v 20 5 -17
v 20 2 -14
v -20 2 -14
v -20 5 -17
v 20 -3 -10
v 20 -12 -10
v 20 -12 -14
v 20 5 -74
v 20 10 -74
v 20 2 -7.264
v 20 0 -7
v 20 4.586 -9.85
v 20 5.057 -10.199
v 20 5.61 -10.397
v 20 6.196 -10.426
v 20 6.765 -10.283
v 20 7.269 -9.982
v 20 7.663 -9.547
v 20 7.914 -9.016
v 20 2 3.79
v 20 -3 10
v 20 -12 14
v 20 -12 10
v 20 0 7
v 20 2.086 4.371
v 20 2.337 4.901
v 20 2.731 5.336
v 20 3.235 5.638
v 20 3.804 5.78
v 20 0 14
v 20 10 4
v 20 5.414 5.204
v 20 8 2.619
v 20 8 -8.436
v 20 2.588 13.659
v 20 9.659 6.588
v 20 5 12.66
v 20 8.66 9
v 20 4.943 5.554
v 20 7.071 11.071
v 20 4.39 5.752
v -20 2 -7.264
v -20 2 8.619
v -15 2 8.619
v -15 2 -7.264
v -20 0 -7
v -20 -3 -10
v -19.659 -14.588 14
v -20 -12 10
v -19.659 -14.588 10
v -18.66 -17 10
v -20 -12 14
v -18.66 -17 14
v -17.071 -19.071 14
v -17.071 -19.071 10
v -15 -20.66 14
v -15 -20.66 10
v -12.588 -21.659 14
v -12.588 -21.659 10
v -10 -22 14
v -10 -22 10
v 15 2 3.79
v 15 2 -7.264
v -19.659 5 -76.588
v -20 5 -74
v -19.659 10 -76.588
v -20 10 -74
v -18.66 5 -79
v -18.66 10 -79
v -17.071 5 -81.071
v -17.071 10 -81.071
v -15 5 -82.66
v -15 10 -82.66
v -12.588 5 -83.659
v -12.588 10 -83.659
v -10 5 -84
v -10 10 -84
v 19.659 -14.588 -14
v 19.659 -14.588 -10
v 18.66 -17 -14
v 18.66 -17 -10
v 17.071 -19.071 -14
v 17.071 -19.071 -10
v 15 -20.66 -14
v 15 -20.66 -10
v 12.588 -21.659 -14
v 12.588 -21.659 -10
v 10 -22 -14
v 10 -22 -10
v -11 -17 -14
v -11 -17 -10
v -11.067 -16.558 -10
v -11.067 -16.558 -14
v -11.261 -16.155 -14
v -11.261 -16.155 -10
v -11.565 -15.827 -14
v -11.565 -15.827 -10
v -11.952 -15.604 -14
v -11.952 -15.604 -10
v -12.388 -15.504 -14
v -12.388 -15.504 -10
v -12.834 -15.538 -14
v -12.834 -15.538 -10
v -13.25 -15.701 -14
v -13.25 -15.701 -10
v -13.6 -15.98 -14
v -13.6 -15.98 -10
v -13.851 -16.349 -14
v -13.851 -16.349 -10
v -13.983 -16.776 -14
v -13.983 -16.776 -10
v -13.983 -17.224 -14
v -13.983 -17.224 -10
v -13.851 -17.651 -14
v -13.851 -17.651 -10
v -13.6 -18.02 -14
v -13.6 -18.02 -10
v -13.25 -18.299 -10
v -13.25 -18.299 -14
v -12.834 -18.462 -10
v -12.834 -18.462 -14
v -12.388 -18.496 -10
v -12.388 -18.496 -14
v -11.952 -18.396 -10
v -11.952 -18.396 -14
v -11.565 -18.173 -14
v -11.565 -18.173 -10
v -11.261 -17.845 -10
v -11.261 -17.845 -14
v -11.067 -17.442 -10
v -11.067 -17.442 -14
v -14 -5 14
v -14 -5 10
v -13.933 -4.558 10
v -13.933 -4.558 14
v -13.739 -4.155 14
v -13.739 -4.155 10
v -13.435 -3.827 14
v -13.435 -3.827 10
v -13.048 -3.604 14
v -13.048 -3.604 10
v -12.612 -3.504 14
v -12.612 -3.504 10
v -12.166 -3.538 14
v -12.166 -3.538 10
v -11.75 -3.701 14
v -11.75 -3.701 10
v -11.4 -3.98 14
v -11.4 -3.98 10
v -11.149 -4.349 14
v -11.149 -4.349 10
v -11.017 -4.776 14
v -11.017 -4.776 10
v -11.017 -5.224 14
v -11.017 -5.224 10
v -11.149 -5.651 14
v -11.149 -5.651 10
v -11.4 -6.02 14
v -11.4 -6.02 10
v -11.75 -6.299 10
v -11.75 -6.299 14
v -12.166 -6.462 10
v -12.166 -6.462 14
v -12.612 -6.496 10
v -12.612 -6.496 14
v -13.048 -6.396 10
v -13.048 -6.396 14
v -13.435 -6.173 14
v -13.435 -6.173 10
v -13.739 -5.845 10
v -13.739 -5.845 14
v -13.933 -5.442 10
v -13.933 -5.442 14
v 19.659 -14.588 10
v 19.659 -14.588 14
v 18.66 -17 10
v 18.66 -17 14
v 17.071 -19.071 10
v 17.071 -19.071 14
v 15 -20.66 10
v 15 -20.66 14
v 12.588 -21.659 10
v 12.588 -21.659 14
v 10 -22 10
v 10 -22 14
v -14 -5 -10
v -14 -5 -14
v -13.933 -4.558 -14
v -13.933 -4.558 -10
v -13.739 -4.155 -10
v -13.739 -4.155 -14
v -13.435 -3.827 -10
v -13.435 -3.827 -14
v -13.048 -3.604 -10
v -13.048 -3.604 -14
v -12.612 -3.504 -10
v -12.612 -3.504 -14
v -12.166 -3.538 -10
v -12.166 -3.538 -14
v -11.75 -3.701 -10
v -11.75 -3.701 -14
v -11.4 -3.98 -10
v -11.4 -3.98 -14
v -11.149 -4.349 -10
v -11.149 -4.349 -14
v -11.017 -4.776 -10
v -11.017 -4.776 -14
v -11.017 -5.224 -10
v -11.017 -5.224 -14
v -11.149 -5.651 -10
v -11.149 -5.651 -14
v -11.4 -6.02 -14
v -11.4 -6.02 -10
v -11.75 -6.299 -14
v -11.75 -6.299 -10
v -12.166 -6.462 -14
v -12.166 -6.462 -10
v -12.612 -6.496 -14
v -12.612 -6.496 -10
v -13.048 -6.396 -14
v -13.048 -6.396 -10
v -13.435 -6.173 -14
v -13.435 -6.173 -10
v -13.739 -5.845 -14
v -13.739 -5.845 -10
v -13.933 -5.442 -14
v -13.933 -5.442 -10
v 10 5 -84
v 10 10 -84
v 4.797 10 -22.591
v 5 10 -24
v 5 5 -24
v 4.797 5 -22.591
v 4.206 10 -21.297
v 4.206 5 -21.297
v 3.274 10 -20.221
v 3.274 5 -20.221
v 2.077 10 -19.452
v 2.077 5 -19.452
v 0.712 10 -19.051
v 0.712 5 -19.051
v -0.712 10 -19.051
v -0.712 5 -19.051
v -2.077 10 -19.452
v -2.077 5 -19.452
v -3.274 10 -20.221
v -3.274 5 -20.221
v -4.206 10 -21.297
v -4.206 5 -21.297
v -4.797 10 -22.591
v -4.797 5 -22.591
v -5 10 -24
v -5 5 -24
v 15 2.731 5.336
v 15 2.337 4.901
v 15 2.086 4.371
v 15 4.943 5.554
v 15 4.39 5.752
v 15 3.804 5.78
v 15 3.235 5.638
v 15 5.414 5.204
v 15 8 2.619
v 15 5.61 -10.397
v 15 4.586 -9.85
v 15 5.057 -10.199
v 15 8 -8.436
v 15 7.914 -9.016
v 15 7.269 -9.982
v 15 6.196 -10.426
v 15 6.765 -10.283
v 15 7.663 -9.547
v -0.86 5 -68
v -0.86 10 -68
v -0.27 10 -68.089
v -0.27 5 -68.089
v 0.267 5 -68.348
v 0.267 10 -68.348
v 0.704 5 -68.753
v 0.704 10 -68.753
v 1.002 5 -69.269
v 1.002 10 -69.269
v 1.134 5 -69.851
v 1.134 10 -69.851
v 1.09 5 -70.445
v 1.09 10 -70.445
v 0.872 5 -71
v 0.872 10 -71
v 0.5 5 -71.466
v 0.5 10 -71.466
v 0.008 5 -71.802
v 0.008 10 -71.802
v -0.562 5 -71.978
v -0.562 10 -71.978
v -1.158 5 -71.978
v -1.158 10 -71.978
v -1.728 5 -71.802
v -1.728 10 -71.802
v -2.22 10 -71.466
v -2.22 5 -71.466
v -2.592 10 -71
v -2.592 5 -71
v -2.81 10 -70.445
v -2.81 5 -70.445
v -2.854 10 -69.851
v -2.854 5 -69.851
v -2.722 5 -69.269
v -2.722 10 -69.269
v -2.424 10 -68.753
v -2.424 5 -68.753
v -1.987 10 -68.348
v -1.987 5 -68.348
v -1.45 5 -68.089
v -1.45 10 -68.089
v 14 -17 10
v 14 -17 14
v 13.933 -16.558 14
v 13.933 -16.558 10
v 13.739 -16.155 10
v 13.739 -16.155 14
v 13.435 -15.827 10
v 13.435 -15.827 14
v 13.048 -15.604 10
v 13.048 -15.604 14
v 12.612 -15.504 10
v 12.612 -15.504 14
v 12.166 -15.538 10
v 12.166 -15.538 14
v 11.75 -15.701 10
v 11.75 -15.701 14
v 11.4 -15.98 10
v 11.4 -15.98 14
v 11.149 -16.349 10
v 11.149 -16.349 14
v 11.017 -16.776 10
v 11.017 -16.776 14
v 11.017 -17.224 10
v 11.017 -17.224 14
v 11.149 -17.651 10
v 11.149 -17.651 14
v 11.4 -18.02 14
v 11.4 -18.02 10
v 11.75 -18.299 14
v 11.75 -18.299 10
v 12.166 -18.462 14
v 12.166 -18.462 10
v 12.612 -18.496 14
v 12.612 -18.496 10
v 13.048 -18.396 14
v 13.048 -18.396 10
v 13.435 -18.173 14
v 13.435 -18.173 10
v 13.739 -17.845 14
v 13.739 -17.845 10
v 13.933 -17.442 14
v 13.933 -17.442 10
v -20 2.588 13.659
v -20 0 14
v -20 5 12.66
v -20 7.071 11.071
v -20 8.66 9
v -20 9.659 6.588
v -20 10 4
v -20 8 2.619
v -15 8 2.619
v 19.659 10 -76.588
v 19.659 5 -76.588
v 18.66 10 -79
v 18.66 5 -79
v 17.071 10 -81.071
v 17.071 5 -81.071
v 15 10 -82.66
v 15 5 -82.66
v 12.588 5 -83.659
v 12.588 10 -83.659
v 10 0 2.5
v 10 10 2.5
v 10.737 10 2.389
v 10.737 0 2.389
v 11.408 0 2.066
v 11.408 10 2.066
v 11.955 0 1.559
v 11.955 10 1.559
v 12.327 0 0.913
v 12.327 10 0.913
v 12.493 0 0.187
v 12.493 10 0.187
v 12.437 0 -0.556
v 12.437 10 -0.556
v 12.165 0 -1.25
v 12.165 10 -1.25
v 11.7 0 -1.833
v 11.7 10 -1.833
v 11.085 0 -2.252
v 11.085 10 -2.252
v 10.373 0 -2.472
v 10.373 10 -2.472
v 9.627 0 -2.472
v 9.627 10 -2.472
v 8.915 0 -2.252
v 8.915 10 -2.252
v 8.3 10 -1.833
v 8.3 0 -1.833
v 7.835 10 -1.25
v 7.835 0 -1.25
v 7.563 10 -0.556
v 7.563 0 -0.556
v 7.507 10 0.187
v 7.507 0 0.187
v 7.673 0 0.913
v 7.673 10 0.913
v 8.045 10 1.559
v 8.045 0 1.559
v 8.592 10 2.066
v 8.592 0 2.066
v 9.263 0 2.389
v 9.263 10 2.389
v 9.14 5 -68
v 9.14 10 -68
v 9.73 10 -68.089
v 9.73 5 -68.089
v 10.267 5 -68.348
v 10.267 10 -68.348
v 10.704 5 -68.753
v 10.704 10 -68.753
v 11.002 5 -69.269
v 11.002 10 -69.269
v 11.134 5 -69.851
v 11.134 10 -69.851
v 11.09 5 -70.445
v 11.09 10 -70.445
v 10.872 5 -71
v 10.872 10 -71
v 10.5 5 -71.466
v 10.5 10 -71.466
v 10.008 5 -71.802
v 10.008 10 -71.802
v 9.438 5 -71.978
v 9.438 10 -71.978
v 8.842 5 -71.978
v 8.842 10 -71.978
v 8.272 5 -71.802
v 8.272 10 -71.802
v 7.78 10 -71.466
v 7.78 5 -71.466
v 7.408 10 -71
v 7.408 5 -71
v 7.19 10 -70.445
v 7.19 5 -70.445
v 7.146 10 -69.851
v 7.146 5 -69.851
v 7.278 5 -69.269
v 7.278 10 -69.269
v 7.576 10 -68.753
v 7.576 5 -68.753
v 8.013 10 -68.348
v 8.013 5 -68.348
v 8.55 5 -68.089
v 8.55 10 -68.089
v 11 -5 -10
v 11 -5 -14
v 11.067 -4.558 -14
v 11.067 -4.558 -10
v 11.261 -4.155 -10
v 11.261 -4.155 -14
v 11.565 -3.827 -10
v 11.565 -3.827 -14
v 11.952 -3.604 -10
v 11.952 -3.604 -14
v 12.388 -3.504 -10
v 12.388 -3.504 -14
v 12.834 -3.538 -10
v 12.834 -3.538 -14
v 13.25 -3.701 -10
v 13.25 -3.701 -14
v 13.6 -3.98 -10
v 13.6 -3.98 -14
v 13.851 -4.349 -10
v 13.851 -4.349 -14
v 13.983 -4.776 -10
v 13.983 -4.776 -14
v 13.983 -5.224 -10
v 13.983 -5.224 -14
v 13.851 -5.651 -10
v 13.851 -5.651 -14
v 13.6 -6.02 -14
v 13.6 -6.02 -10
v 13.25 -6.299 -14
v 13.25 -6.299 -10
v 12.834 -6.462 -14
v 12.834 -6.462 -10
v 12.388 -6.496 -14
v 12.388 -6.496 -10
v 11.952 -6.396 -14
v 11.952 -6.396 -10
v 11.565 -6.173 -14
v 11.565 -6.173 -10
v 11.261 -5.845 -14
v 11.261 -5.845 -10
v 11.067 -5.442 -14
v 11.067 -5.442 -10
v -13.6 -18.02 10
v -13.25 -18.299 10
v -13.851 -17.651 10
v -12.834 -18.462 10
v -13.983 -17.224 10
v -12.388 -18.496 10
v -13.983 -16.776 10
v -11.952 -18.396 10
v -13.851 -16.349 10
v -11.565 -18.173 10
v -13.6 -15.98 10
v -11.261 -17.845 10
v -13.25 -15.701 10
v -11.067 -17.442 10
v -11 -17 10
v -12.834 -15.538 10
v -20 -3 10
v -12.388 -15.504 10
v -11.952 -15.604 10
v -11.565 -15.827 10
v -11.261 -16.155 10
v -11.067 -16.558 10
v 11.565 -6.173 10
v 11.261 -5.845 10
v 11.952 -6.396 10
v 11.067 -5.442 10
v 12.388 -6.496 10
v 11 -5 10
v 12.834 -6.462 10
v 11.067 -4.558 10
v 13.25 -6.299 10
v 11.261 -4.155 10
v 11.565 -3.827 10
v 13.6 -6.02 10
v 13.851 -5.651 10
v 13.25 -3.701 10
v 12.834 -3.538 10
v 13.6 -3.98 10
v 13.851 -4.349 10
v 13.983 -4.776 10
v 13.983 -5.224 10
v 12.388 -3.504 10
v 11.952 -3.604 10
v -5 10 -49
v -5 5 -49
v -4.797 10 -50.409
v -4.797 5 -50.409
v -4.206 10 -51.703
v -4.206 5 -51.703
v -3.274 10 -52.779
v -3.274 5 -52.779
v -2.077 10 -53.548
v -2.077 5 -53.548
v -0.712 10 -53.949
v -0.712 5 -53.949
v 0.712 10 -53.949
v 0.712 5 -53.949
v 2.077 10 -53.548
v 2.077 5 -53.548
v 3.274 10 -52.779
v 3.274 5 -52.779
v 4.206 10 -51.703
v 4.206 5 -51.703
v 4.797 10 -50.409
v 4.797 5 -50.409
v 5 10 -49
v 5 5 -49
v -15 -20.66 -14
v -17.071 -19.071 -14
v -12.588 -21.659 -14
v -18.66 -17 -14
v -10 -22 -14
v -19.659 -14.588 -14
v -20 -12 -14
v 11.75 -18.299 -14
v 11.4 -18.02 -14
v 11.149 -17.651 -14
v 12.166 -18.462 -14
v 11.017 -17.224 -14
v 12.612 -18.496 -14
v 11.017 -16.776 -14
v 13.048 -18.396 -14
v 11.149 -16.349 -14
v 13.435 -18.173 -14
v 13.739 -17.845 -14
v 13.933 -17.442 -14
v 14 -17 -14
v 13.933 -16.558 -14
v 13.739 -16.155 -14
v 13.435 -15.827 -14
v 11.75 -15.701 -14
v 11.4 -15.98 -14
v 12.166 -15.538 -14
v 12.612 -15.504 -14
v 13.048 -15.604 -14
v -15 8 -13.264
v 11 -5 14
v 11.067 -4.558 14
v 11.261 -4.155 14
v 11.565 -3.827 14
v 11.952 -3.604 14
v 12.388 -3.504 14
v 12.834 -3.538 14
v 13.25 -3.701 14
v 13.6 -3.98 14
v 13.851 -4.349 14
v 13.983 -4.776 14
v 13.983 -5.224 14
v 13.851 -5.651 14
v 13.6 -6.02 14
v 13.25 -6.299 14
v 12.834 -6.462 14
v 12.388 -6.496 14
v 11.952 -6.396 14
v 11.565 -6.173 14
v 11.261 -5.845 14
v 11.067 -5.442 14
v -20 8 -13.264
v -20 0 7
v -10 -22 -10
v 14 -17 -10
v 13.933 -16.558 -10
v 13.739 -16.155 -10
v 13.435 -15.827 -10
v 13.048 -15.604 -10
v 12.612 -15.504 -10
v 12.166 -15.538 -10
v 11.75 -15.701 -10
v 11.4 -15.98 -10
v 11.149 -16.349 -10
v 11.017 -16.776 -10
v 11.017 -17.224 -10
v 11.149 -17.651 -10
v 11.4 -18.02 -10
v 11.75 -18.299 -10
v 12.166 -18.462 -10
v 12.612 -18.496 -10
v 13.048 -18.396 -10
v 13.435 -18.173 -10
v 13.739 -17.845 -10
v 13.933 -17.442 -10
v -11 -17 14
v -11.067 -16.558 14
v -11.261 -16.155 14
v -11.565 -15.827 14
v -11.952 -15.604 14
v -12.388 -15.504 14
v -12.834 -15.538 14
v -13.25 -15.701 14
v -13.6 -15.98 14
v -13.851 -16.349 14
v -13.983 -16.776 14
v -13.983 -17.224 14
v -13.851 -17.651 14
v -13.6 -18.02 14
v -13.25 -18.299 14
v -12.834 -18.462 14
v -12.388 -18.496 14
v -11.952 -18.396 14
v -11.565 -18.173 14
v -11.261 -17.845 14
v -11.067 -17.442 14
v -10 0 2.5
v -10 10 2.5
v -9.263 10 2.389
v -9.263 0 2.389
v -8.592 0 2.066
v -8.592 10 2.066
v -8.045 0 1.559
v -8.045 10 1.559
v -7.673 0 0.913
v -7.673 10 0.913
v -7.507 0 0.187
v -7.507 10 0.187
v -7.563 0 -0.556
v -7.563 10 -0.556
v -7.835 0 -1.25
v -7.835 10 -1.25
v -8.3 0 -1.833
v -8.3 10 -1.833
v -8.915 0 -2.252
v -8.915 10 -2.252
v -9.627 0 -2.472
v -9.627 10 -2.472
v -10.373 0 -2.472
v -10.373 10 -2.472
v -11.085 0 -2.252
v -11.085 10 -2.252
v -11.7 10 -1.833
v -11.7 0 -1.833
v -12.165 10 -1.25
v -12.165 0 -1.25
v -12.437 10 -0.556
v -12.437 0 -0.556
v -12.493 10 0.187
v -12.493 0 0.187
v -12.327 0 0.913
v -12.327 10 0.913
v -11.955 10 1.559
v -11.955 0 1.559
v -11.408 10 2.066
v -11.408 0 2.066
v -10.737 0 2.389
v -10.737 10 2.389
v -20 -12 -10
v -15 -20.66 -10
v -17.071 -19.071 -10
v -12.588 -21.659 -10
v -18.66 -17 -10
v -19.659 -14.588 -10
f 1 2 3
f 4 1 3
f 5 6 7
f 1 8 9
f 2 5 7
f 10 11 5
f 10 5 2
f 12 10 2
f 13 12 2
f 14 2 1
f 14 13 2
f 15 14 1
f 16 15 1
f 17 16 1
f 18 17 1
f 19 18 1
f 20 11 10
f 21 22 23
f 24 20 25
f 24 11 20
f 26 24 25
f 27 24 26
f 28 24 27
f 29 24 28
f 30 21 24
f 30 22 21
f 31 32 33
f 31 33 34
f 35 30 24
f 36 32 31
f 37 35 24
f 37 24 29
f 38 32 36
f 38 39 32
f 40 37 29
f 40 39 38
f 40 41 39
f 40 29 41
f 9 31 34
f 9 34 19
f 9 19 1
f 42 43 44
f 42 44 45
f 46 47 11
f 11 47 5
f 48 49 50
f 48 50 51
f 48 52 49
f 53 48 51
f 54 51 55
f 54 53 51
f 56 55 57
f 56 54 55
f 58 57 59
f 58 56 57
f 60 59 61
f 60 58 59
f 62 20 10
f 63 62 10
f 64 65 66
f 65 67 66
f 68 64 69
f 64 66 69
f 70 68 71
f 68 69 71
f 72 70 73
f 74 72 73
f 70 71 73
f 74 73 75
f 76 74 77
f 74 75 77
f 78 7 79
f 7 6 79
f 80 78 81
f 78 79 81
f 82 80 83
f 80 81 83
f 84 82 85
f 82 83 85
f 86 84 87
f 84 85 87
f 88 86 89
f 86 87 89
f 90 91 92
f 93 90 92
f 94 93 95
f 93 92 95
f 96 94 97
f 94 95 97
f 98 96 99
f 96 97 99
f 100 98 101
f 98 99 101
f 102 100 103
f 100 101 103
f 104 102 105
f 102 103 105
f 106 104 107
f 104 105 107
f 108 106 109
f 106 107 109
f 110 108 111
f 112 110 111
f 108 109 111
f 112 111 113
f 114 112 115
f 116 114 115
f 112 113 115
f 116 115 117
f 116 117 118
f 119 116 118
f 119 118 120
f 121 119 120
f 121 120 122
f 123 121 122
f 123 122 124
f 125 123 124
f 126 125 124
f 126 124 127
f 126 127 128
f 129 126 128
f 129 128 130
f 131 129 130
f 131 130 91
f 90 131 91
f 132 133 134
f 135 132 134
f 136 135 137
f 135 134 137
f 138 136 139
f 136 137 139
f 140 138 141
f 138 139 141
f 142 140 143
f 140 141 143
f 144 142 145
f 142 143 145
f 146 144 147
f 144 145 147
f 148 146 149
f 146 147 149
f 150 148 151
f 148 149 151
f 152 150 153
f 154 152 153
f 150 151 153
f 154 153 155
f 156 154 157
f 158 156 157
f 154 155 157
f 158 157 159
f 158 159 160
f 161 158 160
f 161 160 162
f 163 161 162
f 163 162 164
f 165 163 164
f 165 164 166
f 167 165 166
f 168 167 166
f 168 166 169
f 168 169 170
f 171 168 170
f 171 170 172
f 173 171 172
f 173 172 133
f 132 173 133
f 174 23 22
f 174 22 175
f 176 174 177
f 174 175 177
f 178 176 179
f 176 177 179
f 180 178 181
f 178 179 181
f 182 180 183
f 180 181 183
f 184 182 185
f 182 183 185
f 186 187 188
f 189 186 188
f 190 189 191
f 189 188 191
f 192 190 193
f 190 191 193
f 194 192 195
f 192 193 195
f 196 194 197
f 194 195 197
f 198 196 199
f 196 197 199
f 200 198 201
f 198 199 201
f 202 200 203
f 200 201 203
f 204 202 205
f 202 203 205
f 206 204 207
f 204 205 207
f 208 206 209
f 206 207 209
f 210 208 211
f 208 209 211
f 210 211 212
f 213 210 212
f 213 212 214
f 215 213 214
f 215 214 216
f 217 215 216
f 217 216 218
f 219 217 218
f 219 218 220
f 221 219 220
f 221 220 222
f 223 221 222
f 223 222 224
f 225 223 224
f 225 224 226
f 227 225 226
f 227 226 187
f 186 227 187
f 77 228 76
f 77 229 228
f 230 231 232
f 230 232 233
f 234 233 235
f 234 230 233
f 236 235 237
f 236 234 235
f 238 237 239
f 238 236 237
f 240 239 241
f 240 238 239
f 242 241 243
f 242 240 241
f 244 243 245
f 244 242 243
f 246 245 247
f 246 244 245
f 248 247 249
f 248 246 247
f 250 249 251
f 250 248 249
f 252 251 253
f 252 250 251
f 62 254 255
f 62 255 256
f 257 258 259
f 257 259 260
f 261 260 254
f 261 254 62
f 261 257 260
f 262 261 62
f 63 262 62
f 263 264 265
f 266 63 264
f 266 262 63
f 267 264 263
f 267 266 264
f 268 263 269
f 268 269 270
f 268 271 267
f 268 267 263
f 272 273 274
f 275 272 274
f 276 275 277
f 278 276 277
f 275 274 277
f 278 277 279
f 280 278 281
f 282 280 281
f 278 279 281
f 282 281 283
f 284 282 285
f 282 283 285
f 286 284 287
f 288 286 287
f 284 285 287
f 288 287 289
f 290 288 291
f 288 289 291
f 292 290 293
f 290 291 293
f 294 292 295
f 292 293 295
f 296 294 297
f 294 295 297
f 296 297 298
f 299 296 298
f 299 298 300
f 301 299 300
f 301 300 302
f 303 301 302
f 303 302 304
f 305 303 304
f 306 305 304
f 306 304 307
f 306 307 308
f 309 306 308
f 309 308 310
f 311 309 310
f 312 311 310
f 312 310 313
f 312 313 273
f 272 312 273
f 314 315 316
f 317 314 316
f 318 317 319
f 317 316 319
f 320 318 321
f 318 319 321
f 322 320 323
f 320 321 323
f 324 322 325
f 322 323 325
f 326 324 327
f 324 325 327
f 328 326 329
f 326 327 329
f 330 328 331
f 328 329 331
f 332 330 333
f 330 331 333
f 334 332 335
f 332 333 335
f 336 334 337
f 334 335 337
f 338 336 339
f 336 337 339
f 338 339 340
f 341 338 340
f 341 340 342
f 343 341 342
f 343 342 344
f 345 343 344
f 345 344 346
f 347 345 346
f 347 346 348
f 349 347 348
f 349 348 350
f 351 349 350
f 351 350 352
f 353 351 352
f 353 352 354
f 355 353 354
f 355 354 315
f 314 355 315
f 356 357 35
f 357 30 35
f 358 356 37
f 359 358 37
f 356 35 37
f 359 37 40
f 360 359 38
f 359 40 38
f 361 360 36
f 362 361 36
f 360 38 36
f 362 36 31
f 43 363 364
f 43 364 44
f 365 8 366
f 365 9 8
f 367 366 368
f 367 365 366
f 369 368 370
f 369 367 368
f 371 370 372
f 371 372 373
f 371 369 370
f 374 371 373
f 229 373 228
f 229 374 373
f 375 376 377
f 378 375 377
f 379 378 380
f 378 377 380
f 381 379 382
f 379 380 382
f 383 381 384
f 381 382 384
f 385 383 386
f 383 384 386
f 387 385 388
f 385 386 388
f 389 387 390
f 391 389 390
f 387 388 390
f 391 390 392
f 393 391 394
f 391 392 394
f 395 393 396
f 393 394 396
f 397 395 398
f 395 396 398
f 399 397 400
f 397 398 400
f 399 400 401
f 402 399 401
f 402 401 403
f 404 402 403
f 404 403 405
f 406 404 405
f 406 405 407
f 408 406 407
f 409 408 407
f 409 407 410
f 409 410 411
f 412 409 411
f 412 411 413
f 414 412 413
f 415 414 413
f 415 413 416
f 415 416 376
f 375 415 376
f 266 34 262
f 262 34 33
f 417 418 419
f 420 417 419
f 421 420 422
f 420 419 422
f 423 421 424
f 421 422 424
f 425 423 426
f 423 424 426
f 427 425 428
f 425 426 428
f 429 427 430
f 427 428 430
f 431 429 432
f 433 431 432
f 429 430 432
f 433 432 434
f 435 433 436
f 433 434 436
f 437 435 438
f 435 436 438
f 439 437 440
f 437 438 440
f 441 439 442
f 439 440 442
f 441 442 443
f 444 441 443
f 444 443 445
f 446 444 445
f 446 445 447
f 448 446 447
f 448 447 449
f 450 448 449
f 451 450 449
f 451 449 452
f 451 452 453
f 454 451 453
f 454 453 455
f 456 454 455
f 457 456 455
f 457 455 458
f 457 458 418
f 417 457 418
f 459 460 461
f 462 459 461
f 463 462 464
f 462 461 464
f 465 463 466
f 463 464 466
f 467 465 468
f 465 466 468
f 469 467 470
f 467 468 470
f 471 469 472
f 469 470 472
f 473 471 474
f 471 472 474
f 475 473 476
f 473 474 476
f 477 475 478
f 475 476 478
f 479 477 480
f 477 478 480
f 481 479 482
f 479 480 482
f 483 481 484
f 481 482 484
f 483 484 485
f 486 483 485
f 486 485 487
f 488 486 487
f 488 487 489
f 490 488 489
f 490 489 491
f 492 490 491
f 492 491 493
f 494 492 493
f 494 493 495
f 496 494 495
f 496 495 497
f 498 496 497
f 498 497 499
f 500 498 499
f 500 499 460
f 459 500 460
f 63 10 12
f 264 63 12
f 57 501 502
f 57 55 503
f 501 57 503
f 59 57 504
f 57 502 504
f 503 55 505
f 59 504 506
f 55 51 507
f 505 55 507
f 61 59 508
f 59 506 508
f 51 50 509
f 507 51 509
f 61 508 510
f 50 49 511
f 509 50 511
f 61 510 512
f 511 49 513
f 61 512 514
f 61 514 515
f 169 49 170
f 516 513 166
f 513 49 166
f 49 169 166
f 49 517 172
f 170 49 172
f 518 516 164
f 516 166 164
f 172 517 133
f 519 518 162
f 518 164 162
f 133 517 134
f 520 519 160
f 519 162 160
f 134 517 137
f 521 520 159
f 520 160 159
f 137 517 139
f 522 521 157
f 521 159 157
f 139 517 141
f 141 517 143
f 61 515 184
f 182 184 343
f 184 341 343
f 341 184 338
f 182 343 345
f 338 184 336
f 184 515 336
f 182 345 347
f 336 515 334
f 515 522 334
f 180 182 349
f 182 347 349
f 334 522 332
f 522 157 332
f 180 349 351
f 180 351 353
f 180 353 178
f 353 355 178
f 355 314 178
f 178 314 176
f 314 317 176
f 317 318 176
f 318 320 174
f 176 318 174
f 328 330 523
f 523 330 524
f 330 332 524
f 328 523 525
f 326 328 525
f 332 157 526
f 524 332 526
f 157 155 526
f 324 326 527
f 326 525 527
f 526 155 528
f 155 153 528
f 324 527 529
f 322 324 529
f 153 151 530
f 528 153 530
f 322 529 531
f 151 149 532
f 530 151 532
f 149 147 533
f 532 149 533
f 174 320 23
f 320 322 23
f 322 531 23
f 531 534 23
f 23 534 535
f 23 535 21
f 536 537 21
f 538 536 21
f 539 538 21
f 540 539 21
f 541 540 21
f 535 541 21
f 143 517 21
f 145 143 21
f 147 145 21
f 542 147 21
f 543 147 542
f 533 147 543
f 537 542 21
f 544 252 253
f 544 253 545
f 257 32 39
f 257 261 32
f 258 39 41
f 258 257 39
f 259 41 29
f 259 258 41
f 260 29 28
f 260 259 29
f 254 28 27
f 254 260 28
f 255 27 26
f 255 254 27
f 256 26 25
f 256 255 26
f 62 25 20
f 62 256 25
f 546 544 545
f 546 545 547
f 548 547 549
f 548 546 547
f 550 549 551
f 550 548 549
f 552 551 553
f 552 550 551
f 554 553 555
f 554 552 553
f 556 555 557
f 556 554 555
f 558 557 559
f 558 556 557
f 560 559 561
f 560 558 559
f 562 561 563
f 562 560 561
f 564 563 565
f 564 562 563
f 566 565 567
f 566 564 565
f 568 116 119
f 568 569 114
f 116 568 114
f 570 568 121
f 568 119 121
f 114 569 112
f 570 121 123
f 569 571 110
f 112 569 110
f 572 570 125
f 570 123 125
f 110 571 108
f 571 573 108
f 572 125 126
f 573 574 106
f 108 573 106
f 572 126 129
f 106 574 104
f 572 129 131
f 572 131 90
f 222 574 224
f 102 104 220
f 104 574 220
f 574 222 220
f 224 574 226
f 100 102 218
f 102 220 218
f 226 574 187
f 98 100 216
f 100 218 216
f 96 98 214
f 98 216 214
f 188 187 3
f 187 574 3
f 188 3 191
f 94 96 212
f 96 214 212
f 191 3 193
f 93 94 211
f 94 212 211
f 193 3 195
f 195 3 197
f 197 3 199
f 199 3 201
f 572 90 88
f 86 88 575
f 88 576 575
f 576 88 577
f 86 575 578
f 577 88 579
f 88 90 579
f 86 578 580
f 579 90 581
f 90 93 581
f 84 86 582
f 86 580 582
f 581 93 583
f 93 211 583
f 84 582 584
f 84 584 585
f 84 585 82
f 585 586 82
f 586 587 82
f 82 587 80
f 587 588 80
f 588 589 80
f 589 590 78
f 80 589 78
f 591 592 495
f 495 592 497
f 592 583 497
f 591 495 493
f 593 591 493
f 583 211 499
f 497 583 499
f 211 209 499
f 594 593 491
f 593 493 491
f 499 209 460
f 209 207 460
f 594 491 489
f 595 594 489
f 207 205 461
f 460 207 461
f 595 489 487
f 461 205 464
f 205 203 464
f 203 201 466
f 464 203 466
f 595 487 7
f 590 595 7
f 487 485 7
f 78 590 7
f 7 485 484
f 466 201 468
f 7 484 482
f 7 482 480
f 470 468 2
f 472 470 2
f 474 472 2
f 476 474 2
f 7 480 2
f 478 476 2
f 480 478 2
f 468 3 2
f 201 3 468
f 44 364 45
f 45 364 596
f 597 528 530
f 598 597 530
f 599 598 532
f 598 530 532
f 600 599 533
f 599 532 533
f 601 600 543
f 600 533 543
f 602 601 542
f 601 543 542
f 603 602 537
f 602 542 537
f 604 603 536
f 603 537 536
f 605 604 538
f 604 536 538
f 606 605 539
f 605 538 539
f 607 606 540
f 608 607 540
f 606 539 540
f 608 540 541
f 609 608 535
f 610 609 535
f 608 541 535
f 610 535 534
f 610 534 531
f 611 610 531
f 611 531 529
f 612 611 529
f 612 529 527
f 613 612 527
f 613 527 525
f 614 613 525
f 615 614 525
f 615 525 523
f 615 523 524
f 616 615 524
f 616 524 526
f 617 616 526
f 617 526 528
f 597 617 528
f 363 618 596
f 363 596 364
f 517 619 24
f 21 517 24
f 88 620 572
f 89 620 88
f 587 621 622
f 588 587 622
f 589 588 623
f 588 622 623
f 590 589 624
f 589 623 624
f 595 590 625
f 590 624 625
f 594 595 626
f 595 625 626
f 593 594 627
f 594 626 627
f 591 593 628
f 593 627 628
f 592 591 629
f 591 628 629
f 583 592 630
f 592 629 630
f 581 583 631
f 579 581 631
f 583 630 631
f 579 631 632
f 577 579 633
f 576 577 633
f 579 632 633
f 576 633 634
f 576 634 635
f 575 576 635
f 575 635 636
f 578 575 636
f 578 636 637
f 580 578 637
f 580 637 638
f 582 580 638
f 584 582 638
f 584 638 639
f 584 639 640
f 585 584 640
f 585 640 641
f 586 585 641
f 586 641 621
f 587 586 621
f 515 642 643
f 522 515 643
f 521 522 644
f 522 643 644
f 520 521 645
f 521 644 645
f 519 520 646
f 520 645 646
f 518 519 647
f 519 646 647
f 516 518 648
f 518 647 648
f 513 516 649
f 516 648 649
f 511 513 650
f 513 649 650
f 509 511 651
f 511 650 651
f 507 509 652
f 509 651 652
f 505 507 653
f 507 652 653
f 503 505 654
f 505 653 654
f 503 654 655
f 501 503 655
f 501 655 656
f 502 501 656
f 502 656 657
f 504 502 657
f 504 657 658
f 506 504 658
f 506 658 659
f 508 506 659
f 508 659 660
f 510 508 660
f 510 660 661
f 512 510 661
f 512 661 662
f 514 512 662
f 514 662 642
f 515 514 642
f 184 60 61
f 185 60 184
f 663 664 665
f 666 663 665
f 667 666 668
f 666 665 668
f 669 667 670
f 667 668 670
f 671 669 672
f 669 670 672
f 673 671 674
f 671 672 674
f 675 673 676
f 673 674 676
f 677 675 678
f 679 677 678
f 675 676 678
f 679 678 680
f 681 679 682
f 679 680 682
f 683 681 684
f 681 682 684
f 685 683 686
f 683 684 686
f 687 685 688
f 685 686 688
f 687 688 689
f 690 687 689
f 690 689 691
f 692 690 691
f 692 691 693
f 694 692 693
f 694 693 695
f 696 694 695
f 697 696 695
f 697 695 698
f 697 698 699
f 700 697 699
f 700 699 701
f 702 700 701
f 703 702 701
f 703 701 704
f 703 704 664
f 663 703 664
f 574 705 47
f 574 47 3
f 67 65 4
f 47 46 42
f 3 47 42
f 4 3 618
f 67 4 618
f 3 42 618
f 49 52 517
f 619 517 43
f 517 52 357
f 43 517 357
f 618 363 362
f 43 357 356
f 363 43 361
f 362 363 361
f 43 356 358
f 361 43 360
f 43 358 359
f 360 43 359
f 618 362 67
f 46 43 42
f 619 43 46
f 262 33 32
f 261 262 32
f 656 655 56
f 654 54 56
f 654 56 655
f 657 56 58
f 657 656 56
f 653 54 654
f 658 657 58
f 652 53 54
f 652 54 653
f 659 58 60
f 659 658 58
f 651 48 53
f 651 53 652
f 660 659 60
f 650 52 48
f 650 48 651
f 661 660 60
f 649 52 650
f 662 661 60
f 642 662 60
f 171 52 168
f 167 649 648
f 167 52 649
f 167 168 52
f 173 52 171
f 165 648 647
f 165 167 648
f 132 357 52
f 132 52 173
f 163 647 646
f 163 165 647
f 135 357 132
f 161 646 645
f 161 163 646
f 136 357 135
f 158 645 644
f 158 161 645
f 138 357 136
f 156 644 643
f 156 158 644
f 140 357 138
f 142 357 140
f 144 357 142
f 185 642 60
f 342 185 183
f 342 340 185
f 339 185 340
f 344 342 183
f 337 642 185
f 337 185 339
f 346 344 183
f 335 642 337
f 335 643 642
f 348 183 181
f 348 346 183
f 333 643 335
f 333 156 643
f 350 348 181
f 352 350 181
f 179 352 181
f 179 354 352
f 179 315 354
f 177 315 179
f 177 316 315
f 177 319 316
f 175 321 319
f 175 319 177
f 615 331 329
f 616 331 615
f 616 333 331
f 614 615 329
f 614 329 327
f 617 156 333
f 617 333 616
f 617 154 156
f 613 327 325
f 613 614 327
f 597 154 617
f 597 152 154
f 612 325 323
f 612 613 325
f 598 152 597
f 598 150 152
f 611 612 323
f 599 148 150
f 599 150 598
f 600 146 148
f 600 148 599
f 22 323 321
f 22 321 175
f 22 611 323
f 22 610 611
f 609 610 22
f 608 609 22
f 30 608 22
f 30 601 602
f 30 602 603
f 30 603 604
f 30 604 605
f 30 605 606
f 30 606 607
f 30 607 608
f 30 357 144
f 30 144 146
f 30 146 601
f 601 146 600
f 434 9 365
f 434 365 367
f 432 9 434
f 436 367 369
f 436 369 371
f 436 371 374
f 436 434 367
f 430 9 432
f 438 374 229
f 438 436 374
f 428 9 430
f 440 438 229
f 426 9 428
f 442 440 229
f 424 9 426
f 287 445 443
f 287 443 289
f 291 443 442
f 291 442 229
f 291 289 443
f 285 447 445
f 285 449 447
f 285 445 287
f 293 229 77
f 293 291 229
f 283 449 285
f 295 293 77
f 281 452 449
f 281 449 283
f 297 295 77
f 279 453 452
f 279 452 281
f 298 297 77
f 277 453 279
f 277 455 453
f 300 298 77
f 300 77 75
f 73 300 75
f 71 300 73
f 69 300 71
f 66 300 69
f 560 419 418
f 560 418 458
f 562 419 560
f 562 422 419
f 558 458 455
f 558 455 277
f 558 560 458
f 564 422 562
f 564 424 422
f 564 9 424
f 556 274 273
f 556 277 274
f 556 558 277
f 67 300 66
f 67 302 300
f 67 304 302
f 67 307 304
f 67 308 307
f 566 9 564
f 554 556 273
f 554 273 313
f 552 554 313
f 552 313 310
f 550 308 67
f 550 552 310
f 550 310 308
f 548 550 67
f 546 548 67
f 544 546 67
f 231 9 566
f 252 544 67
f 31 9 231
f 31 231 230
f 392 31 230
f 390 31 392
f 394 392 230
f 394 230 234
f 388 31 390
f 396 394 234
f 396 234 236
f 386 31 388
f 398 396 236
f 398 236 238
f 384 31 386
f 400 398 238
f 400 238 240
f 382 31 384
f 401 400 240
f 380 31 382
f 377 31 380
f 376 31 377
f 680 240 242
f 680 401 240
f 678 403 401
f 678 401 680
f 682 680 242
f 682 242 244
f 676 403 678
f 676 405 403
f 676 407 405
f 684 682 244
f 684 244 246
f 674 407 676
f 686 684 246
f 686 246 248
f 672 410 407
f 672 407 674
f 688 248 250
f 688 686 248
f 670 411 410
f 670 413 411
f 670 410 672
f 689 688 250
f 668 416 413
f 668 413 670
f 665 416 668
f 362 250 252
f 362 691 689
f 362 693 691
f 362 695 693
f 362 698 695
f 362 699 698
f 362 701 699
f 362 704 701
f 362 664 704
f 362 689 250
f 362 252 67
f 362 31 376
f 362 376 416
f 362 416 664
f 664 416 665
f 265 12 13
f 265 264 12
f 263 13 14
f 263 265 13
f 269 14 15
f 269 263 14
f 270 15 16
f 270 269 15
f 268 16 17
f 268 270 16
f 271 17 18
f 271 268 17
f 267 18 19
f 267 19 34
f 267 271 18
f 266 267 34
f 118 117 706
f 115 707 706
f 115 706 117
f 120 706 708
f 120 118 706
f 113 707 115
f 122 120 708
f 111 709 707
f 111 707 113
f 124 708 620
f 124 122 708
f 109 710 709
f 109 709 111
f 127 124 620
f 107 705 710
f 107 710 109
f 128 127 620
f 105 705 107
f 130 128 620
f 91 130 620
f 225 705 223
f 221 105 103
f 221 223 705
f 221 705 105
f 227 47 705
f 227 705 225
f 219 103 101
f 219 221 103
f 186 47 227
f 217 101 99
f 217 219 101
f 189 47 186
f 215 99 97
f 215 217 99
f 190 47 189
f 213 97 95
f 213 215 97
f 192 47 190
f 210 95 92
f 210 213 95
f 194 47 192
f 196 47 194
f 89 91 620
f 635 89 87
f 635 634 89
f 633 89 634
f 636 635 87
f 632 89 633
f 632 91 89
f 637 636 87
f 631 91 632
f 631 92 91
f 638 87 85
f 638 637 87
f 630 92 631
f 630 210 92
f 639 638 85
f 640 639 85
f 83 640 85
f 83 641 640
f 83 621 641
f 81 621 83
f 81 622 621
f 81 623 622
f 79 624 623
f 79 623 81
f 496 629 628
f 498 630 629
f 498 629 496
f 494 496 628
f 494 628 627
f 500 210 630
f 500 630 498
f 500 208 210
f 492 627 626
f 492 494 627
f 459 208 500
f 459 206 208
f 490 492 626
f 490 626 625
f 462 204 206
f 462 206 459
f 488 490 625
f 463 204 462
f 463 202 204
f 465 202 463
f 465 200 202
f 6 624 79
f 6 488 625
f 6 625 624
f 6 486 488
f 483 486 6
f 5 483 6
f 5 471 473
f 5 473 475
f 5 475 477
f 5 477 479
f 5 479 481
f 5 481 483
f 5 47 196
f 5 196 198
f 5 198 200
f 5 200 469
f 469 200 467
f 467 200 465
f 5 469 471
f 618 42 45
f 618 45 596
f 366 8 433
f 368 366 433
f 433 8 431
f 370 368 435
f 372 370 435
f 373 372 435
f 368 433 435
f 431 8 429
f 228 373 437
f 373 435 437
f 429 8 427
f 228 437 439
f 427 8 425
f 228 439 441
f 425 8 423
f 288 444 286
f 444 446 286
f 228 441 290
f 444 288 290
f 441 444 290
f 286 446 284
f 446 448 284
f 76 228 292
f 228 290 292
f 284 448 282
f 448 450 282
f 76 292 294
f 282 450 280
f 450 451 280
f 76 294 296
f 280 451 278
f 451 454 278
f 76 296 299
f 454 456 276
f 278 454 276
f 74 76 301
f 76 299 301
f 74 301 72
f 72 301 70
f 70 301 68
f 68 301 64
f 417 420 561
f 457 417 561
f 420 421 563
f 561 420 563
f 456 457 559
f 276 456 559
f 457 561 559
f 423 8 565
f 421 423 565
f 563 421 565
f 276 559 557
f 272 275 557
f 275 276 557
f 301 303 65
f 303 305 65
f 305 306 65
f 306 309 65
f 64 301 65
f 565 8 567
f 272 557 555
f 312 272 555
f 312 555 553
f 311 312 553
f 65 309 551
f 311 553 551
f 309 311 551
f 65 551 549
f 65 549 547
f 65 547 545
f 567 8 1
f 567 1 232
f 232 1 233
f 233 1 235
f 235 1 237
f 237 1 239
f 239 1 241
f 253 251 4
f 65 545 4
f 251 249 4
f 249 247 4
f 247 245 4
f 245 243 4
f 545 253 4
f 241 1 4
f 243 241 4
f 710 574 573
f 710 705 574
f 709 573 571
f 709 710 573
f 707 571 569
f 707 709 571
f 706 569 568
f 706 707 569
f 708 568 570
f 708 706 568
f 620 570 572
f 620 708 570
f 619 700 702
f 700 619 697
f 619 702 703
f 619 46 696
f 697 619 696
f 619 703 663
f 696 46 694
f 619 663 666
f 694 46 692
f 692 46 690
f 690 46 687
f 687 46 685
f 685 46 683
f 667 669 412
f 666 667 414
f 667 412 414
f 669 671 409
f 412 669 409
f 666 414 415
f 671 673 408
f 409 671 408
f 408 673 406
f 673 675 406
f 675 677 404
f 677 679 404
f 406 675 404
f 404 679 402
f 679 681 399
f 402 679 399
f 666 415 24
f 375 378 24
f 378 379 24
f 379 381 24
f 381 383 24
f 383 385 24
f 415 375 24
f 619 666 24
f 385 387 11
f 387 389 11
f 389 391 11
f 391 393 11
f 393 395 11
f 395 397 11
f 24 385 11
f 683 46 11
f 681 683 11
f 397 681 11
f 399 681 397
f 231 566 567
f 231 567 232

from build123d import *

# Parameters (mm, degrees)
SKETCH_1_W          = 40
SKETCH_1_H          = 28
EXTRUDE_1_DEPTH     = 10
SKETCH_2_W          = 40
SKETCH_2_H          = 4
EXTRUDE_2_DEPTH     = 10
SKETCH_4_W          = 40
SKETCH_4_H          = 5
EXTRUDE_3_DEPTH     = 15
SKETCH_6_W          = 40
SKETCH_6_H          = 5
EXTRUDE_4_DEPTH     = 15
SKETCH_8_R          = 2.5
CUT_EXTRUDE_2_DEPTH = 15
CHAMFER_1_SIZE      = 3
FILLET_1_R          = 10
CHAMFER_2_SIZE      = 3
SKETCH_9_R          = 1.5
CUT_EXTRUDE_3_DEPTH = 38.416573868
CUT_EXTRUDE_4_DEPTH = 5
FILLET_3_R          = 2
SKETCH_11_W         = 40
SKETCH_11_H         = 7
EXTRUDE_5_DEPTH     = 3
CHAMFER_3_SIZE      = 1
SKETCH_12_W         = 40
SKETCH_12_H         = 5
EXTRUDE_6_DEPTH     = 30
SKETCH_13_R         = 2
CUT_EXTRUDE_5_DEPTH = 30
SKETCH_16_W         = 20
SKETCH_16_H         = 6.386072782
CUT_EXTRUDE_6_DEPTH = 85.711274338
SKETCH_17_W         = 40
SKETCH_17_H         = 4
EXTRUDE_8_DEPTH     = 12
SKETCH_18_R         = 1.5
CUT_EXTRUDE_7_DEPTH = 93.887028158
CUT_EXTRUDE_8_DEPTH = 84.066238629
SKETCH_21_W         = 40
SKETCH_21_H         = 5
EXTRUDE_9_DEPTH     = 10
FILLET_5_R          = 10


with BuildPart() as part:
    # 草图1 → 凸台-拉伸1 (new body)
    with BuildSketch(Plane(origin=(0, 0, 0), x_dir=(1, 0, 0), z_dir=(0, 1, 0))):
        Rectangle(SKETCH_1_W, SKETCH_1_H)
    extrude(amount=EXTRUDE_1_DEPTH)

    # 草图2 → 凸台-拉伸2 (add)
    with BuildSketch(Plane.XZ):
        with Locations((0, 12)):
            Rectangle(SKETCH_2_W, SKETCH_2_H)
        with Locations((0, -12)):
            Rectangle(SKETCH_2_W, SKETCH_2_H)
    extrude(amount=EXTRUDE_2_DEPTH)

    # 草图4 → 凸台-拉伸3 (add)
    with BuildSketch(Plane(origin=(0, 0, -14), x_dir=(-1, 0, 0), z_dir=(0, 0, -1))):
        with Locations((0, 7.5)):
            Rectangle(SKETCH_4_W, SKETCH_4_H)
    extrude(amount=EXTRUDE_3_DEPTH)

    # 草图6 → 凸台-拉伸4 (add)
    with BuildSketch(Plane(origin=(0, 0, -29), x_dir=(-1, 0, 0), z_dir=(0, 0, -1))):
        with Locations((0, 7.5)):
            Rectangle(SKETCH_6_W, SKETCH_6_H)
    extrude(amount=EXTRUDE_4_DEPTH)

    # 草图8 → 切除-拉伸2 (cut)
    with BuildSketch(Plane(origin=(0, 10, 0), x_dir=(1, 0, 0), z_dir=(0, 1, 0))):
        with Locations(Location((-10, 0, 0), (0, 0, 270))):
            Circle(SKETCH_8_R)
        with Locations(Location((10, 0, 0), (0, 0, 270))):
            Circle(SKETCH_8_R)
    extrude(amount=-CUT_EXTRUDE_2_DEPTH, mode=Mode.SUBTRACT)

    # 倒角1
    chamfer_1_edges = [part.edges().sort_by_distance(p)[0] for p in [
        (0, 0, 10),
        (0, 0, -10),
    ]]
    chamfer(chamfer_1_edges, length=CHAMFER_1_SIZE)

    # 圆角1
    fillet_1_edges = [part.edges().sort_by_distance(p)[0] for p in [
        (0, 10, 14),
    ]]
    fillet(fillet_1_edges, radius=FILLET_1_R)

    # 倒角2
    chamfer_2_edges = [part.edges().sort_by_distance(p)[0] for p in [
        (0, 5, -14),
    ]]
    chamfer(chamfer_2_edges, length=CHAMFER_2_SIZE)

    # 草图9 → 切除-拉伸3 (cut, through all)
    with BuildSketch(Plane(origin=(0, 0, -14), x_dir=(-1, 0, 0), z_dir=(0, 0, -1))):
        with Locations((-12.5, -5)):
            Circle(SKETCH_9_R)
        with Locations((12.5, -5)):
            Circle(SKETCH_9_R)
    extrude(amount=-CUT_EXTRUDE_3_DEPTH, mode=Mode.SUBTRACT)

    # 草图10 → 切除-拉伸4 (cut)
    with BuildSketch(Plane(origin=(20, 0, 0), x_dir=(0, 0, -1), z_dir=(1, 0, 0))):
        Polygon((-2.618541417, 8), (-8.618541417, 2), (7.264071942, 2), (13.264071942, 8), align=None)
    cut_extrude_4 = extrude(amount=-CUT_EXTRUDE_4_DEPTH, mode=Mode.SUBTRACT)

    # 圆角3
    fillet_3_edges = [part.edges().sort_by_distance(p)[0] for p in [
        (17.5, 8, -13.264071942),
        (17.5, 2, 8.618541417),
    ]]
    fillet(fillet_3_edges, radius=FILLET_3_R)

    # 镜向1: 切除-拉伸4 across plane
    add(cut_extrude_4.mirror(Plane(origin=(0, 0, 0), x_dir=(0, 0, 1), z_dir=(1, 0, 0))), mode=Mode.SUBTRACT)

    # 草图11 → 凸台-拉伸5 (add)
    with BuildSketch(Plane.XZ.offset(10)):
        with Locations((0, -10.5)):
            Rectangle(SKETCH_11_W, SKETCH_11_H)
        with Locations((0, 10.5)):
            Rectangle(SKETCH_11_W, SKETCH_11_H)
    extrude(amount=-EXTRUDE_5_DEPTH)

    # 倒角3
    chamfer_3_edges = [part.edges().sort_by_distance(p)[0] for p in [
        (0, -7, -7),
        (0, -7, 7),
    ]]
    chamfer(chamfer_3_edges, length=CHAMFER_3_SIZE)

    # 草图12 → 凸台-拉伸6 (add)
    with BuildSketch(Plane(origin=(0, 0, -44), x_dir=(-1, 0, 0), z_dir=(0, 0, -1))):
        with Locations((0, 7.5)):
            Rectangle(SKETCH_12_W, SKETCH_12_H)
    extrude(amount=EXTRUDE_6_DEPTH)

    # 草图13 → 切除-拉伸5 (cut)
    with BuildSketch(Plane(origin=(0, 10, 0), x_dir=(1, 0, 0), z_dir=(0, 1, 0))):
        with Locations(Location((9.14, 70, 0), (0, 0, 270))):
            Circle(SKETCH_13_R)
        with Locations(Location((-0.86, 70, 0), (0, 0, 270))):
            Circle(SKETCH_13_R)
    extrude(amount=-CUT_EXTRUDE_5_DEPTH, mode=Mode.SUBTRACT)

    # 草图16 → 切除-拉伸6 (cut, through all)
    with BuildSketch(Plane(origin=(20, 0, 0), x_dir=(0, 0, -1), z_dir=(1, 0, 0))):
        with Locations((0, -10.193036391)):
            Rectangle(SKETCH_16_W, SKETCH_16_H)
    extrude(amount=-CUT_EXTRUDE_6_DEPTH, mode=Mode.SUBTRACT)

    # 草图17 → 凸台-拉伸8 (add)
    with BuildSketch(Plane.XZ.offset(10)):
        with Locations((0, -12)):
            Rectangle(SKETCH_17_W, SKETCH_17_H)
        with Locations((0, 12)):
            Rectangle(SKETCH_17_W, SKETCH_17_H)
    extrude(amount=EXTRUDE_8_DEPTH)

    # 草图18 → 切除-拉伸7 (cut, through all)
    with BuildSketch(Plane.XY.offset(14)):
        with Locations(Location((12.5, -5, 0), (0, 0, 180))):
            Circle(SKETCH_18_R)
        with Locations(Location((-12.5, -5, 0), (0, 0, 180))):
            Circle(SKETCH_18_R)
        with Locations((-12.5, -17)):
            Circle(SKETCH_18_R)
        with Locations((12.5, -17)):
            Circle(SKETCH_18_R)
    extrude(amount=-CUT_EXTRUDE_7_DEPTH, mode=Mode.SUBTRACT)

    # 草图19 → 切除-拉伸8 (cut, through all)
    with BuildSketch(Plane(origin=(0, 10, 0), x_dir=(1, 0, 0), z_dir=(0, 1, 0))):
        with BuildLine():
            Line((5, 49), (5, 24))
            ThreePointArc((5, 24), (0, 19), (-5, 24))
            Line((-5, 24), (-5, 49))
            ThreePointArc((-5, 49), (0, 54), (5, 49))
        make_face()
    extrude(amount=-CUT_EXTRUDE_8_DEPTH, mode=Mode.SUBTRACT)

    # 草图21 → 凸台-拉伸9 (add)
    with BuildSketch(Plane(origin=(0, 0, -74), x_dir=(-1, 0, 0), z_dir=(0, 0, -1))):
        with Locations((0, 7.5)):
            Rectangle(SKETCH_21_W, SKETCH_21_H)
    extrude(amount=EXTRUDE_9_DEPTH)

    # 圆角5
    fillet_5_edges = [part.edges().sort_by_distance(p)[0] for p in [
        (-20, -22, -12),
        (20, -22, -12),
        (-20, -22, 12),
        (20, -22, 12),
        (20, 7.5, -84),
        (-20, 7.5, -84),
    ]]
    fillet(fillet_5_edges, radius=FILLET_5_R)


solid = part.part
